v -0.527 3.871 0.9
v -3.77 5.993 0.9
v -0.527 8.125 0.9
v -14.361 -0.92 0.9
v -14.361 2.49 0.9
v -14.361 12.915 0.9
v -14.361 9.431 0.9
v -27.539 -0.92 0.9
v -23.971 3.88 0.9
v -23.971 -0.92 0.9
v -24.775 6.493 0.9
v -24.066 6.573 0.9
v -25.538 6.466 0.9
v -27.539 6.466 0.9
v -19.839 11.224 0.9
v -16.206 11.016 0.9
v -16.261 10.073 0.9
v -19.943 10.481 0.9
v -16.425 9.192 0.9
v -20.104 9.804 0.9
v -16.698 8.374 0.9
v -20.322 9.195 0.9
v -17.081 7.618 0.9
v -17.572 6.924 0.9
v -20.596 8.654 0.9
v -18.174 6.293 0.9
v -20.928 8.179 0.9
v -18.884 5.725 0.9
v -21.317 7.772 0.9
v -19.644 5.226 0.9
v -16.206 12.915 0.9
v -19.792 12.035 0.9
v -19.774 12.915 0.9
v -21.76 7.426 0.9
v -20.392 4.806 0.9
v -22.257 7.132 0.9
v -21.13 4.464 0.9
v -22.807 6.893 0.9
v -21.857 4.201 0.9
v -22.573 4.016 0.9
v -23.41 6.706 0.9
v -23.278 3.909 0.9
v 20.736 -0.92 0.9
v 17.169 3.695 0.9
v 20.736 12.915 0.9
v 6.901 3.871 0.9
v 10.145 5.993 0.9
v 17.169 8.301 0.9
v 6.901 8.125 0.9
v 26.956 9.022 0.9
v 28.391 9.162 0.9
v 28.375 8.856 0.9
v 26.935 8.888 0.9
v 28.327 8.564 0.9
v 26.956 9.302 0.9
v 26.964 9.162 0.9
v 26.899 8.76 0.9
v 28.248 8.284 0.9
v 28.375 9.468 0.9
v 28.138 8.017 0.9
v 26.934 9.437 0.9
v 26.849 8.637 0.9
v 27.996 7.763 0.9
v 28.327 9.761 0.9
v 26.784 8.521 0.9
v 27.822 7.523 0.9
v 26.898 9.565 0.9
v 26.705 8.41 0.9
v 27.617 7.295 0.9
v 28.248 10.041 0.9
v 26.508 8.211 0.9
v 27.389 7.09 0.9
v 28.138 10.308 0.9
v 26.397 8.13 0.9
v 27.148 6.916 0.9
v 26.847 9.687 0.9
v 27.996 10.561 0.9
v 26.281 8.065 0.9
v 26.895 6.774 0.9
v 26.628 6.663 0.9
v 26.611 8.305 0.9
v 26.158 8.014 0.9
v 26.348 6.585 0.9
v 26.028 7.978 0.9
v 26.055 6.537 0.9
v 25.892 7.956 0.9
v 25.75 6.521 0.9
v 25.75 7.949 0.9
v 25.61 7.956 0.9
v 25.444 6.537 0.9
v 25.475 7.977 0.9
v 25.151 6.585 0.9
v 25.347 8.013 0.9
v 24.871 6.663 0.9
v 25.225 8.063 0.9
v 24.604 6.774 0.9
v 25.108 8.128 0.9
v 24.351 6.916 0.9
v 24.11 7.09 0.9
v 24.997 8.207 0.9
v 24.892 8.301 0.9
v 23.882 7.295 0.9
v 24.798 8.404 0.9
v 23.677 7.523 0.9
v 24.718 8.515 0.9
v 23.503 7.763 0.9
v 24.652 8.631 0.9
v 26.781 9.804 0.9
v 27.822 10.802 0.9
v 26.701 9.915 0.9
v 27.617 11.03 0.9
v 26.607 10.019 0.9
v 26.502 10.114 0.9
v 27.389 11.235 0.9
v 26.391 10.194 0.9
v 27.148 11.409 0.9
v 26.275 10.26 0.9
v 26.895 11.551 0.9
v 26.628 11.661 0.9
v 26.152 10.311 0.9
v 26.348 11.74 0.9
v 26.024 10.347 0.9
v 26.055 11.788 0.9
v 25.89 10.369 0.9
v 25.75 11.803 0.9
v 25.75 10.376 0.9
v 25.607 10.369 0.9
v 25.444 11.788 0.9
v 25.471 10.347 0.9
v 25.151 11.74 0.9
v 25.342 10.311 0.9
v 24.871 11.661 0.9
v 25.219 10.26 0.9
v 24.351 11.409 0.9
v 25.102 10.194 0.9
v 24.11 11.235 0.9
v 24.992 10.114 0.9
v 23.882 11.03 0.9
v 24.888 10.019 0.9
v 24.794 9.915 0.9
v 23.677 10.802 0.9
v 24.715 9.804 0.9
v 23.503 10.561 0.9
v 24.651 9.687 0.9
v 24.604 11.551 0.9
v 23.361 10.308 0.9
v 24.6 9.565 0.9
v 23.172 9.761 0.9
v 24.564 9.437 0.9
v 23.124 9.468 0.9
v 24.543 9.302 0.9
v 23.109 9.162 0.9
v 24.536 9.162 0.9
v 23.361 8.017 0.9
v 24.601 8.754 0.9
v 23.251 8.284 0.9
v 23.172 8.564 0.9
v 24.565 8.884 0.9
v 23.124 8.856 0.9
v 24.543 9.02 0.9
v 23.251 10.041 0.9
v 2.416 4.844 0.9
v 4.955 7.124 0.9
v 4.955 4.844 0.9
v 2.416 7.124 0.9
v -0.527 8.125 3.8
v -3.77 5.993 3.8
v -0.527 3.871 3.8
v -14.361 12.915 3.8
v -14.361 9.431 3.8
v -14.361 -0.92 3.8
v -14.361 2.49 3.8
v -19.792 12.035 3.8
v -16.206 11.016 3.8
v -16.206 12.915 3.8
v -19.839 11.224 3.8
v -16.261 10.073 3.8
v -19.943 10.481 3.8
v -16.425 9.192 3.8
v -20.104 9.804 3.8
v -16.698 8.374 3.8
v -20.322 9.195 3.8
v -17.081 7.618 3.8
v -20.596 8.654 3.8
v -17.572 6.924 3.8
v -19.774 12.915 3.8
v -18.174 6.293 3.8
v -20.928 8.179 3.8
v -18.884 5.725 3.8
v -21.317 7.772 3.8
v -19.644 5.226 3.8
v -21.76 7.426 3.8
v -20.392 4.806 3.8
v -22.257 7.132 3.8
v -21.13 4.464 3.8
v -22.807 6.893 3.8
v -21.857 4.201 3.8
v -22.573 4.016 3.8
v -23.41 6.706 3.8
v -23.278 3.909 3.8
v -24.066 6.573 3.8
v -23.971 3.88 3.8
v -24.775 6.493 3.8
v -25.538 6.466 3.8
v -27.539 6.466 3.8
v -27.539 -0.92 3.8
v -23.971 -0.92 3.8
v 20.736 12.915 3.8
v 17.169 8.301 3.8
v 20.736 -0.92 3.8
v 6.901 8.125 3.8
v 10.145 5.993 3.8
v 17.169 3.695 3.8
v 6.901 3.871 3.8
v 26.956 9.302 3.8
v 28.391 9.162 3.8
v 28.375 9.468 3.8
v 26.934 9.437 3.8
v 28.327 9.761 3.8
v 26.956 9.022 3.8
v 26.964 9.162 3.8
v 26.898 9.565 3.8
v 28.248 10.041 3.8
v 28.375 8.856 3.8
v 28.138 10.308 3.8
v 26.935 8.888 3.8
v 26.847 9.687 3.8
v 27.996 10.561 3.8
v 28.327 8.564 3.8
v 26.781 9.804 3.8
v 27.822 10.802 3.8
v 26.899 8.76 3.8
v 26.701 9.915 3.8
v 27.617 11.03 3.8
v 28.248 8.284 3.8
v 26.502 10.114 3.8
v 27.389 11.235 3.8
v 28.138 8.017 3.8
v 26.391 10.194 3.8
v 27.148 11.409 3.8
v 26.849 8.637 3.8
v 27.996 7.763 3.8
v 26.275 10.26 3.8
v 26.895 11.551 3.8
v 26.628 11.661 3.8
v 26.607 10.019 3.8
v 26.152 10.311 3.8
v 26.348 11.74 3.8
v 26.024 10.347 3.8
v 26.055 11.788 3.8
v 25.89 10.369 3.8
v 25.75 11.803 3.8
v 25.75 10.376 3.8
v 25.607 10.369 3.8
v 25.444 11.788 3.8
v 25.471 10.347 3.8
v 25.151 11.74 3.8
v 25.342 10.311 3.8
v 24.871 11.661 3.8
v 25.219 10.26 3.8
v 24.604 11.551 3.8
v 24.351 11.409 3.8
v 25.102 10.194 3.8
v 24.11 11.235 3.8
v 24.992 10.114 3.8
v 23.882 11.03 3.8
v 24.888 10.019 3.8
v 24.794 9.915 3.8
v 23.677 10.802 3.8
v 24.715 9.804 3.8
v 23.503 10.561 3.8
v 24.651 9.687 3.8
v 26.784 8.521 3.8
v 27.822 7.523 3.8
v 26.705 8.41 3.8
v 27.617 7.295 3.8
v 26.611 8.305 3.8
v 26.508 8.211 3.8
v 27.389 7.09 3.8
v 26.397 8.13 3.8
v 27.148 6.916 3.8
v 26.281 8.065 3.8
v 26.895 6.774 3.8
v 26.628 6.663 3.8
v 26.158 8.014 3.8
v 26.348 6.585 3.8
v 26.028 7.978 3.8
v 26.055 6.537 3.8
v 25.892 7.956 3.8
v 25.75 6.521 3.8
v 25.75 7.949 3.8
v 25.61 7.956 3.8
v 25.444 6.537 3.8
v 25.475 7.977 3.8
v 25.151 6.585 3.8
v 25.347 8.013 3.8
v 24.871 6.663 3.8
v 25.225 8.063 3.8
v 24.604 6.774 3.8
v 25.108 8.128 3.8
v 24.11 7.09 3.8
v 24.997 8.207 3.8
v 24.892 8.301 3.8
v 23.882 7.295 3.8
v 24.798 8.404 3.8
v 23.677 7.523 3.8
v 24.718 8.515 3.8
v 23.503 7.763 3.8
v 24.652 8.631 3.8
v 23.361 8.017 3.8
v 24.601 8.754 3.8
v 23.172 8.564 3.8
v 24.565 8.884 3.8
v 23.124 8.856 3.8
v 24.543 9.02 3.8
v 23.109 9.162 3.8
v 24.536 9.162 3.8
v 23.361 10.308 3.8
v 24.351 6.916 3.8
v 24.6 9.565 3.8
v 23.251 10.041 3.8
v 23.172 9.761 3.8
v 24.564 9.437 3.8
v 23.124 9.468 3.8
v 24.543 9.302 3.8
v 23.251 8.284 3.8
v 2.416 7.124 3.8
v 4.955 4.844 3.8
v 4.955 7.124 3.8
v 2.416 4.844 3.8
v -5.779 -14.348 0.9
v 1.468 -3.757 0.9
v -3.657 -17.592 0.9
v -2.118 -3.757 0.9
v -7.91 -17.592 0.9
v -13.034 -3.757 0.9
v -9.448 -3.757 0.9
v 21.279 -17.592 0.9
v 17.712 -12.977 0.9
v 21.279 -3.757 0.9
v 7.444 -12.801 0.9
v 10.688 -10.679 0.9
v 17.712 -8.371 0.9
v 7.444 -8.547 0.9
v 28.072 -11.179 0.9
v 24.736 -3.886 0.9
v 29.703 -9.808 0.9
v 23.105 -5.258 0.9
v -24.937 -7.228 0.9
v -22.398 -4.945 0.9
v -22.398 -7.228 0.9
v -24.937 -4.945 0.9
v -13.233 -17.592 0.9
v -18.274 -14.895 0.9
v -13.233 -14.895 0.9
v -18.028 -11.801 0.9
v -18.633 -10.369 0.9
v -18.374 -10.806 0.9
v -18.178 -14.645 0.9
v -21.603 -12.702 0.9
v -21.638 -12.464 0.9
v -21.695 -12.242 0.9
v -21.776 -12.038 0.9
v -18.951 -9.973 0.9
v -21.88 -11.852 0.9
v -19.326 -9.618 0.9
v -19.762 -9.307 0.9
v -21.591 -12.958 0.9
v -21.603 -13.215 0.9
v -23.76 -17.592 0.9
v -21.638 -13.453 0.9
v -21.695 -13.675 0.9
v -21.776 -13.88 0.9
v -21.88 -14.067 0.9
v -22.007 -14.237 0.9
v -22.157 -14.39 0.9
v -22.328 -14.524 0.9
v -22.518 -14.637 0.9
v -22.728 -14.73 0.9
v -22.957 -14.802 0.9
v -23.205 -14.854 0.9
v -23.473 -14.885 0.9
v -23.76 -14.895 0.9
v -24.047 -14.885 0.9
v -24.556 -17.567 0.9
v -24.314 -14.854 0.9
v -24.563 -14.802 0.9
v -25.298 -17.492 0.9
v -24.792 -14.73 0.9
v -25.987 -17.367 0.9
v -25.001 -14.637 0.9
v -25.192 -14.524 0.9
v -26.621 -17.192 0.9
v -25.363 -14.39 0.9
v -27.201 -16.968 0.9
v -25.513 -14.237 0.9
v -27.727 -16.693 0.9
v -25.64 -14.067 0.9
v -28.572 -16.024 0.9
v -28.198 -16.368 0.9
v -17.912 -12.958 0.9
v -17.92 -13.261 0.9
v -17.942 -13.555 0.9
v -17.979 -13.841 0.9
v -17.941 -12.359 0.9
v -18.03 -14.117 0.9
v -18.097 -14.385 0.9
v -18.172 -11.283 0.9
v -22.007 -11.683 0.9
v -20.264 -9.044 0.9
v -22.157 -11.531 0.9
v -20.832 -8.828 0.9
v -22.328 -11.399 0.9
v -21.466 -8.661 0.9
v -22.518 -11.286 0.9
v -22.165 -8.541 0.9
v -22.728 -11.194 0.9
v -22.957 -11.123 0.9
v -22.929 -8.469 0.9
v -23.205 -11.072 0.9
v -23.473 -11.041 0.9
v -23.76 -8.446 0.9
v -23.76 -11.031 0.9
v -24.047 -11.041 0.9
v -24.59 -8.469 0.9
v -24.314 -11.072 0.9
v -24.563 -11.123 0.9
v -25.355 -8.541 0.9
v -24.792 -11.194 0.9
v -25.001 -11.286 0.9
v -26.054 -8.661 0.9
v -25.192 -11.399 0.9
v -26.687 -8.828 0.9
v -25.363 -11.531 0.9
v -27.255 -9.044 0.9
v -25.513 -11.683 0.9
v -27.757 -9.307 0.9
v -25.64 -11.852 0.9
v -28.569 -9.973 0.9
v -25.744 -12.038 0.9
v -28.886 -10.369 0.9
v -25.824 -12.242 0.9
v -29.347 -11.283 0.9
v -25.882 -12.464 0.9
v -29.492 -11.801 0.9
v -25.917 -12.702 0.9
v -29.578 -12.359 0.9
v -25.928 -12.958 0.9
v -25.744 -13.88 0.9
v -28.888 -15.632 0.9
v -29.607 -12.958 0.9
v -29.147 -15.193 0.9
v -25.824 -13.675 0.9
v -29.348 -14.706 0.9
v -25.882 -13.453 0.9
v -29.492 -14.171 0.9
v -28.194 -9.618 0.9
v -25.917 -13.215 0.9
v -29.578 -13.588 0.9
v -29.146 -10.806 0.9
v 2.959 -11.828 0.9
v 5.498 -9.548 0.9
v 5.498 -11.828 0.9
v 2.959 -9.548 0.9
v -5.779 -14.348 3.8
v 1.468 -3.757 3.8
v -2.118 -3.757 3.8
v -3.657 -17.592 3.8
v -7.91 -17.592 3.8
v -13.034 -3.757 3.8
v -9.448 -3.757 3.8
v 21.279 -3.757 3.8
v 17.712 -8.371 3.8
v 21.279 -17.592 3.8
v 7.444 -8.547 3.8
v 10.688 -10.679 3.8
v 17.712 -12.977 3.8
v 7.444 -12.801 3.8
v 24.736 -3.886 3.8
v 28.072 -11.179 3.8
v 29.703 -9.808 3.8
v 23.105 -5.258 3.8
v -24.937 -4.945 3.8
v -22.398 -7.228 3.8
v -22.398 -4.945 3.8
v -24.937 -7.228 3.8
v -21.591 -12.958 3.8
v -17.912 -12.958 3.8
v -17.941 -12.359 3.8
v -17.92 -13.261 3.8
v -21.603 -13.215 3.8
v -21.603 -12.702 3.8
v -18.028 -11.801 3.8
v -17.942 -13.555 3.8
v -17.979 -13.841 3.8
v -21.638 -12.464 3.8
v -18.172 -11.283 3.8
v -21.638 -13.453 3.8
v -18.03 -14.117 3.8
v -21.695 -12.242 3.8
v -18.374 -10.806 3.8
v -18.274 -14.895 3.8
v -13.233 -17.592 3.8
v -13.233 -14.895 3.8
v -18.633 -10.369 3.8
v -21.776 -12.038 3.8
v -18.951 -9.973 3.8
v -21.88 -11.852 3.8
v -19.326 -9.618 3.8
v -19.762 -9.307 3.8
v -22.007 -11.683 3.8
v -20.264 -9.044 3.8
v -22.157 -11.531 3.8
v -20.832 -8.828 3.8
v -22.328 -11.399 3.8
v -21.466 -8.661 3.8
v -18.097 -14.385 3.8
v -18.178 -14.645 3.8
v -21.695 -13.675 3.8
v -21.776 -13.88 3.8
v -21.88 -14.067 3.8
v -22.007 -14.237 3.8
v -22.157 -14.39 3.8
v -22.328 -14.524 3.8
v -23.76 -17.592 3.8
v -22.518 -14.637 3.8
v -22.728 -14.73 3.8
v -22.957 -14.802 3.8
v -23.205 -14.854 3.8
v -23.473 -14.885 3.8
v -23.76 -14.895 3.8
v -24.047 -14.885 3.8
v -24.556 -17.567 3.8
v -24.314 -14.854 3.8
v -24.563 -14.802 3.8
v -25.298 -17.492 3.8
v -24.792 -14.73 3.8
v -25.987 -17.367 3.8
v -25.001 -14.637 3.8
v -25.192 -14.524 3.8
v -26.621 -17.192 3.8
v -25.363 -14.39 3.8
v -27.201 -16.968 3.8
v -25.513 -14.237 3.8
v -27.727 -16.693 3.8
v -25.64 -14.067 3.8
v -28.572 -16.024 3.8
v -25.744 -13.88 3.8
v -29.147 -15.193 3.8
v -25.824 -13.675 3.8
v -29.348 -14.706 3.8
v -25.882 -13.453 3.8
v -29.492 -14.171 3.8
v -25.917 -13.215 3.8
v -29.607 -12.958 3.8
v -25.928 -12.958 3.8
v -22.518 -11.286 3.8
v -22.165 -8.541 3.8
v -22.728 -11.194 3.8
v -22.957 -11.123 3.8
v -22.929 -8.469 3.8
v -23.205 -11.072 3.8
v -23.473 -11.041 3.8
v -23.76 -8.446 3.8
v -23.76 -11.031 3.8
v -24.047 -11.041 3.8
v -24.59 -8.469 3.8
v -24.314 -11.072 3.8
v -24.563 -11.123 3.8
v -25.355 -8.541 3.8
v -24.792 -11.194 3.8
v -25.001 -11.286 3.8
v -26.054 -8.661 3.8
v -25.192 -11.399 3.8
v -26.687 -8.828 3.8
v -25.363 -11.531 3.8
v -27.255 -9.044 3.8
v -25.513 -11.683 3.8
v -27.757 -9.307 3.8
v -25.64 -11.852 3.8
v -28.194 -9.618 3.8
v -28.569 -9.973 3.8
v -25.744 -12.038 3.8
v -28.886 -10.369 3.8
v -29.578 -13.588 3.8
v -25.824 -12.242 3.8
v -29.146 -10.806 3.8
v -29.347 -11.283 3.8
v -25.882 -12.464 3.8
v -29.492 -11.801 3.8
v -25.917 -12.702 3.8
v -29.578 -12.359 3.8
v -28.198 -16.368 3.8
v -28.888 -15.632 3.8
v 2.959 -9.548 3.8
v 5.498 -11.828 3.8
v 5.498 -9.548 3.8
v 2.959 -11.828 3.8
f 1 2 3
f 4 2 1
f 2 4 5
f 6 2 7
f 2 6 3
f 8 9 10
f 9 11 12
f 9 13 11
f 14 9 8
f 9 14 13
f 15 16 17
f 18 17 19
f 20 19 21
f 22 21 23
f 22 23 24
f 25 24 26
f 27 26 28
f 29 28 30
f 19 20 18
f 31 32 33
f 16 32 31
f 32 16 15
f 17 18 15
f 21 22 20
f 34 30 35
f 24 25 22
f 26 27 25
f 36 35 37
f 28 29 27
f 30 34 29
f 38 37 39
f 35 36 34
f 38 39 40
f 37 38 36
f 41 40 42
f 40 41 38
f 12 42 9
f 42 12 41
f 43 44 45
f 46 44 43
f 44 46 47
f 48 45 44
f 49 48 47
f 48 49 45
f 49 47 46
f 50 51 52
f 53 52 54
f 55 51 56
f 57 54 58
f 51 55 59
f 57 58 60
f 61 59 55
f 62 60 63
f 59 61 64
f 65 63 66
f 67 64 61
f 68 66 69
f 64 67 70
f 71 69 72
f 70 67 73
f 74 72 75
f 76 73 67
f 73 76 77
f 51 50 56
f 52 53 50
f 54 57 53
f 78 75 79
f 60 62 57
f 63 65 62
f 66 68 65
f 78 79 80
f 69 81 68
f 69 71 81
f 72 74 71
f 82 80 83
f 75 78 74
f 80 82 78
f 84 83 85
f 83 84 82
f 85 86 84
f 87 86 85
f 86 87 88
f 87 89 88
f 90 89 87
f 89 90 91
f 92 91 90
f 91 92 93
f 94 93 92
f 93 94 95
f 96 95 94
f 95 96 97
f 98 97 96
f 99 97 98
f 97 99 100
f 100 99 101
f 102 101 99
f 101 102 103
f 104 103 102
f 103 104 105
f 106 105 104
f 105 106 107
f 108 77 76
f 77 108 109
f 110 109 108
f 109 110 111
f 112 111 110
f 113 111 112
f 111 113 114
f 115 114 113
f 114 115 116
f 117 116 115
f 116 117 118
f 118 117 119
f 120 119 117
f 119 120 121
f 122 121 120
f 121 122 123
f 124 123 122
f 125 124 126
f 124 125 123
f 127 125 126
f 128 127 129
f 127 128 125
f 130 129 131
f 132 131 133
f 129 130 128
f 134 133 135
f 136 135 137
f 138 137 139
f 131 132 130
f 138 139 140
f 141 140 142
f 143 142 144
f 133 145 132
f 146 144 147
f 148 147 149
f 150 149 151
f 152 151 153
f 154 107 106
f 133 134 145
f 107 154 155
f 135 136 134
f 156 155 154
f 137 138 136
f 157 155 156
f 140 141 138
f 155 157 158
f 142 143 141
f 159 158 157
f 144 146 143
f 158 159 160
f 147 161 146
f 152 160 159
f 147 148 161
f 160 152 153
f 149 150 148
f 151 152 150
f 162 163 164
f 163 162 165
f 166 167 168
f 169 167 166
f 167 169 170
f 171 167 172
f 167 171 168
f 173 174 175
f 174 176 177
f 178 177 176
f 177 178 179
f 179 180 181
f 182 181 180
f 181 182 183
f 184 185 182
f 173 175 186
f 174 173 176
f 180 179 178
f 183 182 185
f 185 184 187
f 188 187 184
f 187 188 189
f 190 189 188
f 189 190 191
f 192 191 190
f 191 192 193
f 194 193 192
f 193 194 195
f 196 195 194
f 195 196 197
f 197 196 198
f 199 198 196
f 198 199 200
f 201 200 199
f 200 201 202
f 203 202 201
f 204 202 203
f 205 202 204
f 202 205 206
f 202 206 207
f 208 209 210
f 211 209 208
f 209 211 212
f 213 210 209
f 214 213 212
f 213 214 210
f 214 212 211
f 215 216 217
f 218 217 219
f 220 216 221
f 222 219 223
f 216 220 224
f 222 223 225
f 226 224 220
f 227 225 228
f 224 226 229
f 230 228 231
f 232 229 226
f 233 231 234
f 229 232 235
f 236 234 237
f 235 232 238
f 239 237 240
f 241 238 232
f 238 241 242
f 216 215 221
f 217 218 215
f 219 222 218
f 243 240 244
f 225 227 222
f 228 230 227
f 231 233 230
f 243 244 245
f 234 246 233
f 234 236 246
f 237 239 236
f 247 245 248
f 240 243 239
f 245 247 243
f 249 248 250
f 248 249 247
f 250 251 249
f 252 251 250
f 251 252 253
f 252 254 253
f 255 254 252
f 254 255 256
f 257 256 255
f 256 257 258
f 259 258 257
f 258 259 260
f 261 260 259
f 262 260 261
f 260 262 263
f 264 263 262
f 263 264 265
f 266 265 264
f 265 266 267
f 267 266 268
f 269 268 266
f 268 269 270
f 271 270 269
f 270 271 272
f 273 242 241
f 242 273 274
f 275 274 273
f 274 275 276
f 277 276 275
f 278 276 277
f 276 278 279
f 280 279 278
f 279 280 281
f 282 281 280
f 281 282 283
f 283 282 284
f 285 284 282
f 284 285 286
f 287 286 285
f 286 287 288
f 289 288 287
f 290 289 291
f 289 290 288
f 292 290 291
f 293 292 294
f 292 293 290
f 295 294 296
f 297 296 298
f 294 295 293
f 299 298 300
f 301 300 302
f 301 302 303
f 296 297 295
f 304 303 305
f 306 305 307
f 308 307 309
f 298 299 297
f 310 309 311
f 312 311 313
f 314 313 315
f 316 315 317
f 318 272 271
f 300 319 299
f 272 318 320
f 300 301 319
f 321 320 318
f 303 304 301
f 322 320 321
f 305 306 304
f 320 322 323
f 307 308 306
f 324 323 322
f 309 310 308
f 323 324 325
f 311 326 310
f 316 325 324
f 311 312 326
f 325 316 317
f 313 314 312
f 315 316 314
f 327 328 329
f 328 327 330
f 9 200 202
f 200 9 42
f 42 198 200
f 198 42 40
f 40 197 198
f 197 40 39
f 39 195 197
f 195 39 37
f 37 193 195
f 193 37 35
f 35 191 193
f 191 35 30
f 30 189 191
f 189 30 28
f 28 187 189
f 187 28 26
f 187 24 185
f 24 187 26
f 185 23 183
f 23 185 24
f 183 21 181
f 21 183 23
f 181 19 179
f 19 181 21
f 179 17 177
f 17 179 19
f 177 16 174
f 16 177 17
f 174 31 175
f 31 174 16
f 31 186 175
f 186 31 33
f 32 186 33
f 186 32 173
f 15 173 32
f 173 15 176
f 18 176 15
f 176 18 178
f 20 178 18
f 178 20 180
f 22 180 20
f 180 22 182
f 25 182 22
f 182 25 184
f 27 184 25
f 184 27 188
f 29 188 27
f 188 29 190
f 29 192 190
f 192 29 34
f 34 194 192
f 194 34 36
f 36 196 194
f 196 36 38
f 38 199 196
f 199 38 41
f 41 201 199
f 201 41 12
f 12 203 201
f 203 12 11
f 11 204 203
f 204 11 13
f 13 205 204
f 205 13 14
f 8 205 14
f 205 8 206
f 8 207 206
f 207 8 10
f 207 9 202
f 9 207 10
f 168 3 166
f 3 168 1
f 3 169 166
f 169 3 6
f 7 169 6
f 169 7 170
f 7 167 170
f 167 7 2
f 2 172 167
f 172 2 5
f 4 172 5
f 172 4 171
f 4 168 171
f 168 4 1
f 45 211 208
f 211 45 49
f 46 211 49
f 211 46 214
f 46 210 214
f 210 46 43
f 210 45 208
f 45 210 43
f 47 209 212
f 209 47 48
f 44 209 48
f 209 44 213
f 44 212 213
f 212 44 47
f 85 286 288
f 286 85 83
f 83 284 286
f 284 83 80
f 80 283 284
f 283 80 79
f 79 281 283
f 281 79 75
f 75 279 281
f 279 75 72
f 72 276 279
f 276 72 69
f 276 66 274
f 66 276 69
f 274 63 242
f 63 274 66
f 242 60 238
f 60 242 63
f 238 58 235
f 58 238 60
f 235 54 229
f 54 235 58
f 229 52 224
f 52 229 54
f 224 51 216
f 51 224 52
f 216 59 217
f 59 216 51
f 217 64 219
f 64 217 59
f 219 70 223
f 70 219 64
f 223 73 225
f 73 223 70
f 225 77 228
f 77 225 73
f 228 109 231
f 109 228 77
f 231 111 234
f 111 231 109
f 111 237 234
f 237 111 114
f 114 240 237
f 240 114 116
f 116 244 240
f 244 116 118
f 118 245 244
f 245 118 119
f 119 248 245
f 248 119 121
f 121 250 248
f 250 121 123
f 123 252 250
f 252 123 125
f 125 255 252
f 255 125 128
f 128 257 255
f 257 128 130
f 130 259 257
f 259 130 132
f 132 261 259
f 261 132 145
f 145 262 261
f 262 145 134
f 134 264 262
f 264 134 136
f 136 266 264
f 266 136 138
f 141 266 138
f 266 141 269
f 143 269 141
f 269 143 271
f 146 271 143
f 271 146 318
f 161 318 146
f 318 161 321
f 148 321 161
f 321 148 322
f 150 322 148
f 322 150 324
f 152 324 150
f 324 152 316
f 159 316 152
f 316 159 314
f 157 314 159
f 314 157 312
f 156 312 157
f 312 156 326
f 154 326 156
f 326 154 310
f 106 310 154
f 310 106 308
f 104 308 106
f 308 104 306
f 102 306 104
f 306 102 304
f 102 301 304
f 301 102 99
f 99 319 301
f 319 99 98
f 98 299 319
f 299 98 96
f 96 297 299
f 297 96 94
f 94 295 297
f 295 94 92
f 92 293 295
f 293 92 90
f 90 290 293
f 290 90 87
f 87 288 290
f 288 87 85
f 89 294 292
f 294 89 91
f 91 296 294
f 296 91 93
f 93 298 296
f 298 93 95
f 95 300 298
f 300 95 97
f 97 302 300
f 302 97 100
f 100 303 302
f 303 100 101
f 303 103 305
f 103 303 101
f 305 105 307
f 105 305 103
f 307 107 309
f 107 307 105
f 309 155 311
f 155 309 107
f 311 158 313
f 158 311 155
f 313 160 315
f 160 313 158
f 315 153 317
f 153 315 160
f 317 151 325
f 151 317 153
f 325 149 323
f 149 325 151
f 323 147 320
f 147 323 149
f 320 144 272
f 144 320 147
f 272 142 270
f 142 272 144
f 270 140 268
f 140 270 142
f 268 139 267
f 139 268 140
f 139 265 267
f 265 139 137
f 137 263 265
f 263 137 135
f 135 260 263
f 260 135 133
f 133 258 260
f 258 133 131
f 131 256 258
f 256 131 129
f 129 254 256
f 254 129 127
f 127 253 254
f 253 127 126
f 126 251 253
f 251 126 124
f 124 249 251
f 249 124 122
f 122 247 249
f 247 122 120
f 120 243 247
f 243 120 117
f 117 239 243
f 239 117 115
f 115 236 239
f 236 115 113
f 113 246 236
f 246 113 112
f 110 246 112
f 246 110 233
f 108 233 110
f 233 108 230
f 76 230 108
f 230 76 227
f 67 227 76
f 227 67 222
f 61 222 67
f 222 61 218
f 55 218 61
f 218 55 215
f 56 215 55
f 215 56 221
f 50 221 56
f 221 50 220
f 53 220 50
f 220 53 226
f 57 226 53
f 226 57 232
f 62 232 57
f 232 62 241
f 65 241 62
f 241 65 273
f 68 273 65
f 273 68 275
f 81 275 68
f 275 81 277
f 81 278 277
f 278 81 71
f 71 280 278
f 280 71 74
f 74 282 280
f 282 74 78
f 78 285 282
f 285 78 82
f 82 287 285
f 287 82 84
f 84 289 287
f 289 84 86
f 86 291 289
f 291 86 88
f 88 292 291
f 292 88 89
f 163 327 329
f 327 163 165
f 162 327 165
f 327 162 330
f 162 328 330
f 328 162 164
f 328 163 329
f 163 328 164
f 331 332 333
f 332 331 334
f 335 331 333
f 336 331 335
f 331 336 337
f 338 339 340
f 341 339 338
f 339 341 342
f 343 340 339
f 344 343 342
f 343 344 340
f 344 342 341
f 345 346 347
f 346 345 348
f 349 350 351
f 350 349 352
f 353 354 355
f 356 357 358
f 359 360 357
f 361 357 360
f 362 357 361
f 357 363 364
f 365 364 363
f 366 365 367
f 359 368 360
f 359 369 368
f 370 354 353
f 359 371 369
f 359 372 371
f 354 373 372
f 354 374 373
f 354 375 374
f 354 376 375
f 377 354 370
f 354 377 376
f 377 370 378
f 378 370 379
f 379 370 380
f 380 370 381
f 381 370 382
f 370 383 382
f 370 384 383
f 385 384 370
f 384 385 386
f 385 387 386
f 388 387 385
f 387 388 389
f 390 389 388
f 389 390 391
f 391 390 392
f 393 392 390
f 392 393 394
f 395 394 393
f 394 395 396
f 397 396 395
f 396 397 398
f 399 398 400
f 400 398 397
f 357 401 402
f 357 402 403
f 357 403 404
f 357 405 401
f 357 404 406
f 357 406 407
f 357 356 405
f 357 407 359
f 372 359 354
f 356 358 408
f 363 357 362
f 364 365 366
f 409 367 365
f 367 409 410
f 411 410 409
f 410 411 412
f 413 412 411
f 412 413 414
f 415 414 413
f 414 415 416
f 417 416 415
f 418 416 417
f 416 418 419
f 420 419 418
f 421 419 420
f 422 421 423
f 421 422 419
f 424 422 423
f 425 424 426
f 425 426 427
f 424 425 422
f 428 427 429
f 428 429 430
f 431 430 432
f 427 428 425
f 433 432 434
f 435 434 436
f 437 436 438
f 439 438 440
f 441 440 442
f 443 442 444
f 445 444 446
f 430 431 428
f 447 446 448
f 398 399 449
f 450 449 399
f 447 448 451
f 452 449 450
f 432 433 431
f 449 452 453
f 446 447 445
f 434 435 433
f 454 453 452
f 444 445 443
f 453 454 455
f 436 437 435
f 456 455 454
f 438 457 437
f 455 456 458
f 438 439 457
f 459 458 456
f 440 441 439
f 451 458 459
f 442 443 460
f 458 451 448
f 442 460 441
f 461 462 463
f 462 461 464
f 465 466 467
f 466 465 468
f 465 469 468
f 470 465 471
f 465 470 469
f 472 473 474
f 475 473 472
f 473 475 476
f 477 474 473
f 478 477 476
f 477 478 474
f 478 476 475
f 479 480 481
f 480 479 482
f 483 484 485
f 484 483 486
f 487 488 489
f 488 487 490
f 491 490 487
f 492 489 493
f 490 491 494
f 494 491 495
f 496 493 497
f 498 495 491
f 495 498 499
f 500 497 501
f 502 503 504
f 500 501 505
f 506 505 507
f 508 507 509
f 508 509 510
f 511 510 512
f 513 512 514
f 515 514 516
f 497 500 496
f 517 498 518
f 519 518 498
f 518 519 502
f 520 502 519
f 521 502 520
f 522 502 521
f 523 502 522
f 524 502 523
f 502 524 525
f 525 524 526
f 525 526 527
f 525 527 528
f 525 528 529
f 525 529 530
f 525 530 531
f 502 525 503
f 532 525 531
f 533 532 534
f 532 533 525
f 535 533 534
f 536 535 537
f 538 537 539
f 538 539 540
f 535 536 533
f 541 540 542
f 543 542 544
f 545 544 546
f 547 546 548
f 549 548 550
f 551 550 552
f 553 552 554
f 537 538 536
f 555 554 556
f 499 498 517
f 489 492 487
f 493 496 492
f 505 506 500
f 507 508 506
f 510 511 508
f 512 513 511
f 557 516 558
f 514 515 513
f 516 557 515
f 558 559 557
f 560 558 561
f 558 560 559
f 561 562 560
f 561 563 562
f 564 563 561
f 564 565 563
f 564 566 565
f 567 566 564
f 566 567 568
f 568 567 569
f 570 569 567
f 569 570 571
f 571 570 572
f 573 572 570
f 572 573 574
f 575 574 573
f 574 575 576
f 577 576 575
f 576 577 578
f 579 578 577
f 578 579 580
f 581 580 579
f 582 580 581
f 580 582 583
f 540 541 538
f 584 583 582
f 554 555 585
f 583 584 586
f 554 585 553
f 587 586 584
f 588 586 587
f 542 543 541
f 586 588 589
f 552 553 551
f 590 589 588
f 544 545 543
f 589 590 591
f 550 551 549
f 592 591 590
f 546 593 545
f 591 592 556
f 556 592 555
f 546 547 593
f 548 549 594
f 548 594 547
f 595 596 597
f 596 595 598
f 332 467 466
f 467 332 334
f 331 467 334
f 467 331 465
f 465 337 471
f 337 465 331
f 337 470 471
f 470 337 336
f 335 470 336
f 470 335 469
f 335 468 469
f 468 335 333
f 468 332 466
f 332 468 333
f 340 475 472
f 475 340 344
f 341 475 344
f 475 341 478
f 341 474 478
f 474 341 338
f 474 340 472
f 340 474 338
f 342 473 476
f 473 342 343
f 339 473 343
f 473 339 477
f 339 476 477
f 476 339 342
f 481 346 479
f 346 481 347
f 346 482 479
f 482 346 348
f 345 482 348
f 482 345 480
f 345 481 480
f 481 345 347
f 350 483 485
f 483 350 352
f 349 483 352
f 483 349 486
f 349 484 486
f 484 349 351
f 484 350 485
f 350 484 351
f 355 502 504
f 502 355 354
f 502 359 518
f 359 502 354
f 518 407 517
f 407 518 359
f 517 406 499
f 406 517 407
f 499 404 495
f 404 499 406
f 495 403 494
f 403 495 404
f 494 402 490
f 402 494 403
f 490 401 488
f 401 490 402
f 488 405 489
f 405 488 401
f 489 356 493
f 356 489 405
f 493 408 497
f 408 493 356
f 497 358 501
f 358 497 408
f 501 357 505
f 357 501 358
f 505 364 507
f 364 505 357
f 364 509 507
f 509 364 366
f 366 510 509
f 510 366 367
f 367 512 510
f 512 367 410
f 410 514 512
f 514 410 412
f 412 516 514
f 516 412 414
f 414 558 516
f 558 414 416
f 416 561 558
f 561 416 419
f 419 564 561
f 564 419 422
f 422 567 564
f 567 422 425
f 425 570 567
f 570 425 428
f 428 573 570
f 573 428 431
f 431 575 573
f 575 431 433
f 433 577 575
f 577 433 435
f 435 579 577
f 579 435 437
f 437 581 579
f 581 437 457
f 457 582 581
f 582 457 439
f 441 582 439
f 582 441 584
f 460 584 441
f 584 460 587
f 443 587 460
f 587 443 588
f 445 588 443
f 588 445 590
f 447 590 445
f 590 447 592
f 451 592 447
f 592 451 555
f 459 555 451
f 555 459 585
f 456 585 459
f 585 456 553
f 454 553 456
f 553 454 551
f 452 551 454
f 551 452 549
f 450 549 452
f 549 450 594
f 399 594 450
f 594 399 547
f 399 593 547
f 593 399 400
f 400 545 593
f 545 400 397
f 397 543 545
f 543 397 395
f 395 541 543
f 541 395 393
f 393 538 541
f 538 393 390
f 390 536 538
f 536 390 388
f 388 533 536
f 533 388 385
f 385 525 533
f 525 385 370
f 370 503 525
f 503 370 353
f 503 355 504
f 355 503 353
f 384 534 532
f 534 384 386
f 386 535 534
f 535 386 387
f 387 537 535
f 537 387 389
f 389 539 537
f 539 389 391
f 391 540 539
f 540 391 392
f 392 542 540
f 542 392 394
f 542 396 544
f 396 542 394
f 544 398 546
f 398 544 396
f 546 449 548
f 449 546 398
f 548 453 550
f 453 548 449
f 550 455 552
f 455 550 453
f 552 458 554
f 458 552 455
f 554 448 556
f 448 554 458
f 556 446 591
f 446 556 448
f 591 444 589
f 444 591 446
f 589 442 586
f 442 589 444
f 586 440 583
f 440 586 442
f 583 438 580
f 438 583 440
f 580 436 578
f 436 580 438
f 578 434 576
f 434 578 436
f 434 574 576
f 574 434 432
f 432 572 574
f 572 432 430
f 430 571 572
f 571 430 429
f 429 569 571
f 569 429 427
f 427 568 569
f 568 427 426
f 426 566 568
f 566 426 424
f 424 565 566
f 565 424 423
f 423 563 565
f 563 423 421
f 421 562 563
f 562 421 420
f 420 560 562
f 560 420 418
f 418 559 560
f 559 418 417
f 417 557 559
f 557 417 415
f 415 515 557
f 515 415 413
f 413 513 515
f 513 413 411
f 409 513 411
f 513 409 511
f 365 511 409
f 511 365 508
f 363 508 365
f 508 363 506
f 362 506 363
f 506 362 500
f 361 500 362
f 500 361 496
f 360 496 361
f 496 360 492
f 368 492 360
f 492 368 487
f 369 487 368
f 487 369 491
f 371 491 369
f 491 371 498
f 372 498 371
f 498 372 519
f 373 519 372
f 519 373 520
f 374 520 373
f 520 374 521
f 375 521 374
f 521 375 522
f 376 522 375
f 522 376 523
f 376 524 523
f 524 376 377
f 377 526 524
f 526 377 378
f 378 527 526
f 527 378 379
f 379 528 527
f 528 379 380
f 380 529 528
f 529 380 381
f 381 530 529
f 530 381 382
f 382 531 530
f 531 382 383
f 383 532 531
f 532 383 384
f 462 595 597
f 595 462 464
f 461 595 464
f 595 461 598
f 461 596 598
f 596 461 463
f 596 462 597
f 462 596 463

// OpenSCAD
$fn = 48;
  // syllabics (overlaid on icon, tallest)
  translate([0, 5.836, 0.900]) linear_extrude(height=2.900) text("ᓯᐳᐗᐤ", size=13.665, halign="center", valign="center", font="Euphemia UCAS:style=Bold");
  translate([0, -10.836, 0.900]) linear_extrude(height=2.900) text("ᓈᐯᐗᐠ", size=13.665, halign="center", valign="center", font="Euphemia UCAS:style=Bold");
